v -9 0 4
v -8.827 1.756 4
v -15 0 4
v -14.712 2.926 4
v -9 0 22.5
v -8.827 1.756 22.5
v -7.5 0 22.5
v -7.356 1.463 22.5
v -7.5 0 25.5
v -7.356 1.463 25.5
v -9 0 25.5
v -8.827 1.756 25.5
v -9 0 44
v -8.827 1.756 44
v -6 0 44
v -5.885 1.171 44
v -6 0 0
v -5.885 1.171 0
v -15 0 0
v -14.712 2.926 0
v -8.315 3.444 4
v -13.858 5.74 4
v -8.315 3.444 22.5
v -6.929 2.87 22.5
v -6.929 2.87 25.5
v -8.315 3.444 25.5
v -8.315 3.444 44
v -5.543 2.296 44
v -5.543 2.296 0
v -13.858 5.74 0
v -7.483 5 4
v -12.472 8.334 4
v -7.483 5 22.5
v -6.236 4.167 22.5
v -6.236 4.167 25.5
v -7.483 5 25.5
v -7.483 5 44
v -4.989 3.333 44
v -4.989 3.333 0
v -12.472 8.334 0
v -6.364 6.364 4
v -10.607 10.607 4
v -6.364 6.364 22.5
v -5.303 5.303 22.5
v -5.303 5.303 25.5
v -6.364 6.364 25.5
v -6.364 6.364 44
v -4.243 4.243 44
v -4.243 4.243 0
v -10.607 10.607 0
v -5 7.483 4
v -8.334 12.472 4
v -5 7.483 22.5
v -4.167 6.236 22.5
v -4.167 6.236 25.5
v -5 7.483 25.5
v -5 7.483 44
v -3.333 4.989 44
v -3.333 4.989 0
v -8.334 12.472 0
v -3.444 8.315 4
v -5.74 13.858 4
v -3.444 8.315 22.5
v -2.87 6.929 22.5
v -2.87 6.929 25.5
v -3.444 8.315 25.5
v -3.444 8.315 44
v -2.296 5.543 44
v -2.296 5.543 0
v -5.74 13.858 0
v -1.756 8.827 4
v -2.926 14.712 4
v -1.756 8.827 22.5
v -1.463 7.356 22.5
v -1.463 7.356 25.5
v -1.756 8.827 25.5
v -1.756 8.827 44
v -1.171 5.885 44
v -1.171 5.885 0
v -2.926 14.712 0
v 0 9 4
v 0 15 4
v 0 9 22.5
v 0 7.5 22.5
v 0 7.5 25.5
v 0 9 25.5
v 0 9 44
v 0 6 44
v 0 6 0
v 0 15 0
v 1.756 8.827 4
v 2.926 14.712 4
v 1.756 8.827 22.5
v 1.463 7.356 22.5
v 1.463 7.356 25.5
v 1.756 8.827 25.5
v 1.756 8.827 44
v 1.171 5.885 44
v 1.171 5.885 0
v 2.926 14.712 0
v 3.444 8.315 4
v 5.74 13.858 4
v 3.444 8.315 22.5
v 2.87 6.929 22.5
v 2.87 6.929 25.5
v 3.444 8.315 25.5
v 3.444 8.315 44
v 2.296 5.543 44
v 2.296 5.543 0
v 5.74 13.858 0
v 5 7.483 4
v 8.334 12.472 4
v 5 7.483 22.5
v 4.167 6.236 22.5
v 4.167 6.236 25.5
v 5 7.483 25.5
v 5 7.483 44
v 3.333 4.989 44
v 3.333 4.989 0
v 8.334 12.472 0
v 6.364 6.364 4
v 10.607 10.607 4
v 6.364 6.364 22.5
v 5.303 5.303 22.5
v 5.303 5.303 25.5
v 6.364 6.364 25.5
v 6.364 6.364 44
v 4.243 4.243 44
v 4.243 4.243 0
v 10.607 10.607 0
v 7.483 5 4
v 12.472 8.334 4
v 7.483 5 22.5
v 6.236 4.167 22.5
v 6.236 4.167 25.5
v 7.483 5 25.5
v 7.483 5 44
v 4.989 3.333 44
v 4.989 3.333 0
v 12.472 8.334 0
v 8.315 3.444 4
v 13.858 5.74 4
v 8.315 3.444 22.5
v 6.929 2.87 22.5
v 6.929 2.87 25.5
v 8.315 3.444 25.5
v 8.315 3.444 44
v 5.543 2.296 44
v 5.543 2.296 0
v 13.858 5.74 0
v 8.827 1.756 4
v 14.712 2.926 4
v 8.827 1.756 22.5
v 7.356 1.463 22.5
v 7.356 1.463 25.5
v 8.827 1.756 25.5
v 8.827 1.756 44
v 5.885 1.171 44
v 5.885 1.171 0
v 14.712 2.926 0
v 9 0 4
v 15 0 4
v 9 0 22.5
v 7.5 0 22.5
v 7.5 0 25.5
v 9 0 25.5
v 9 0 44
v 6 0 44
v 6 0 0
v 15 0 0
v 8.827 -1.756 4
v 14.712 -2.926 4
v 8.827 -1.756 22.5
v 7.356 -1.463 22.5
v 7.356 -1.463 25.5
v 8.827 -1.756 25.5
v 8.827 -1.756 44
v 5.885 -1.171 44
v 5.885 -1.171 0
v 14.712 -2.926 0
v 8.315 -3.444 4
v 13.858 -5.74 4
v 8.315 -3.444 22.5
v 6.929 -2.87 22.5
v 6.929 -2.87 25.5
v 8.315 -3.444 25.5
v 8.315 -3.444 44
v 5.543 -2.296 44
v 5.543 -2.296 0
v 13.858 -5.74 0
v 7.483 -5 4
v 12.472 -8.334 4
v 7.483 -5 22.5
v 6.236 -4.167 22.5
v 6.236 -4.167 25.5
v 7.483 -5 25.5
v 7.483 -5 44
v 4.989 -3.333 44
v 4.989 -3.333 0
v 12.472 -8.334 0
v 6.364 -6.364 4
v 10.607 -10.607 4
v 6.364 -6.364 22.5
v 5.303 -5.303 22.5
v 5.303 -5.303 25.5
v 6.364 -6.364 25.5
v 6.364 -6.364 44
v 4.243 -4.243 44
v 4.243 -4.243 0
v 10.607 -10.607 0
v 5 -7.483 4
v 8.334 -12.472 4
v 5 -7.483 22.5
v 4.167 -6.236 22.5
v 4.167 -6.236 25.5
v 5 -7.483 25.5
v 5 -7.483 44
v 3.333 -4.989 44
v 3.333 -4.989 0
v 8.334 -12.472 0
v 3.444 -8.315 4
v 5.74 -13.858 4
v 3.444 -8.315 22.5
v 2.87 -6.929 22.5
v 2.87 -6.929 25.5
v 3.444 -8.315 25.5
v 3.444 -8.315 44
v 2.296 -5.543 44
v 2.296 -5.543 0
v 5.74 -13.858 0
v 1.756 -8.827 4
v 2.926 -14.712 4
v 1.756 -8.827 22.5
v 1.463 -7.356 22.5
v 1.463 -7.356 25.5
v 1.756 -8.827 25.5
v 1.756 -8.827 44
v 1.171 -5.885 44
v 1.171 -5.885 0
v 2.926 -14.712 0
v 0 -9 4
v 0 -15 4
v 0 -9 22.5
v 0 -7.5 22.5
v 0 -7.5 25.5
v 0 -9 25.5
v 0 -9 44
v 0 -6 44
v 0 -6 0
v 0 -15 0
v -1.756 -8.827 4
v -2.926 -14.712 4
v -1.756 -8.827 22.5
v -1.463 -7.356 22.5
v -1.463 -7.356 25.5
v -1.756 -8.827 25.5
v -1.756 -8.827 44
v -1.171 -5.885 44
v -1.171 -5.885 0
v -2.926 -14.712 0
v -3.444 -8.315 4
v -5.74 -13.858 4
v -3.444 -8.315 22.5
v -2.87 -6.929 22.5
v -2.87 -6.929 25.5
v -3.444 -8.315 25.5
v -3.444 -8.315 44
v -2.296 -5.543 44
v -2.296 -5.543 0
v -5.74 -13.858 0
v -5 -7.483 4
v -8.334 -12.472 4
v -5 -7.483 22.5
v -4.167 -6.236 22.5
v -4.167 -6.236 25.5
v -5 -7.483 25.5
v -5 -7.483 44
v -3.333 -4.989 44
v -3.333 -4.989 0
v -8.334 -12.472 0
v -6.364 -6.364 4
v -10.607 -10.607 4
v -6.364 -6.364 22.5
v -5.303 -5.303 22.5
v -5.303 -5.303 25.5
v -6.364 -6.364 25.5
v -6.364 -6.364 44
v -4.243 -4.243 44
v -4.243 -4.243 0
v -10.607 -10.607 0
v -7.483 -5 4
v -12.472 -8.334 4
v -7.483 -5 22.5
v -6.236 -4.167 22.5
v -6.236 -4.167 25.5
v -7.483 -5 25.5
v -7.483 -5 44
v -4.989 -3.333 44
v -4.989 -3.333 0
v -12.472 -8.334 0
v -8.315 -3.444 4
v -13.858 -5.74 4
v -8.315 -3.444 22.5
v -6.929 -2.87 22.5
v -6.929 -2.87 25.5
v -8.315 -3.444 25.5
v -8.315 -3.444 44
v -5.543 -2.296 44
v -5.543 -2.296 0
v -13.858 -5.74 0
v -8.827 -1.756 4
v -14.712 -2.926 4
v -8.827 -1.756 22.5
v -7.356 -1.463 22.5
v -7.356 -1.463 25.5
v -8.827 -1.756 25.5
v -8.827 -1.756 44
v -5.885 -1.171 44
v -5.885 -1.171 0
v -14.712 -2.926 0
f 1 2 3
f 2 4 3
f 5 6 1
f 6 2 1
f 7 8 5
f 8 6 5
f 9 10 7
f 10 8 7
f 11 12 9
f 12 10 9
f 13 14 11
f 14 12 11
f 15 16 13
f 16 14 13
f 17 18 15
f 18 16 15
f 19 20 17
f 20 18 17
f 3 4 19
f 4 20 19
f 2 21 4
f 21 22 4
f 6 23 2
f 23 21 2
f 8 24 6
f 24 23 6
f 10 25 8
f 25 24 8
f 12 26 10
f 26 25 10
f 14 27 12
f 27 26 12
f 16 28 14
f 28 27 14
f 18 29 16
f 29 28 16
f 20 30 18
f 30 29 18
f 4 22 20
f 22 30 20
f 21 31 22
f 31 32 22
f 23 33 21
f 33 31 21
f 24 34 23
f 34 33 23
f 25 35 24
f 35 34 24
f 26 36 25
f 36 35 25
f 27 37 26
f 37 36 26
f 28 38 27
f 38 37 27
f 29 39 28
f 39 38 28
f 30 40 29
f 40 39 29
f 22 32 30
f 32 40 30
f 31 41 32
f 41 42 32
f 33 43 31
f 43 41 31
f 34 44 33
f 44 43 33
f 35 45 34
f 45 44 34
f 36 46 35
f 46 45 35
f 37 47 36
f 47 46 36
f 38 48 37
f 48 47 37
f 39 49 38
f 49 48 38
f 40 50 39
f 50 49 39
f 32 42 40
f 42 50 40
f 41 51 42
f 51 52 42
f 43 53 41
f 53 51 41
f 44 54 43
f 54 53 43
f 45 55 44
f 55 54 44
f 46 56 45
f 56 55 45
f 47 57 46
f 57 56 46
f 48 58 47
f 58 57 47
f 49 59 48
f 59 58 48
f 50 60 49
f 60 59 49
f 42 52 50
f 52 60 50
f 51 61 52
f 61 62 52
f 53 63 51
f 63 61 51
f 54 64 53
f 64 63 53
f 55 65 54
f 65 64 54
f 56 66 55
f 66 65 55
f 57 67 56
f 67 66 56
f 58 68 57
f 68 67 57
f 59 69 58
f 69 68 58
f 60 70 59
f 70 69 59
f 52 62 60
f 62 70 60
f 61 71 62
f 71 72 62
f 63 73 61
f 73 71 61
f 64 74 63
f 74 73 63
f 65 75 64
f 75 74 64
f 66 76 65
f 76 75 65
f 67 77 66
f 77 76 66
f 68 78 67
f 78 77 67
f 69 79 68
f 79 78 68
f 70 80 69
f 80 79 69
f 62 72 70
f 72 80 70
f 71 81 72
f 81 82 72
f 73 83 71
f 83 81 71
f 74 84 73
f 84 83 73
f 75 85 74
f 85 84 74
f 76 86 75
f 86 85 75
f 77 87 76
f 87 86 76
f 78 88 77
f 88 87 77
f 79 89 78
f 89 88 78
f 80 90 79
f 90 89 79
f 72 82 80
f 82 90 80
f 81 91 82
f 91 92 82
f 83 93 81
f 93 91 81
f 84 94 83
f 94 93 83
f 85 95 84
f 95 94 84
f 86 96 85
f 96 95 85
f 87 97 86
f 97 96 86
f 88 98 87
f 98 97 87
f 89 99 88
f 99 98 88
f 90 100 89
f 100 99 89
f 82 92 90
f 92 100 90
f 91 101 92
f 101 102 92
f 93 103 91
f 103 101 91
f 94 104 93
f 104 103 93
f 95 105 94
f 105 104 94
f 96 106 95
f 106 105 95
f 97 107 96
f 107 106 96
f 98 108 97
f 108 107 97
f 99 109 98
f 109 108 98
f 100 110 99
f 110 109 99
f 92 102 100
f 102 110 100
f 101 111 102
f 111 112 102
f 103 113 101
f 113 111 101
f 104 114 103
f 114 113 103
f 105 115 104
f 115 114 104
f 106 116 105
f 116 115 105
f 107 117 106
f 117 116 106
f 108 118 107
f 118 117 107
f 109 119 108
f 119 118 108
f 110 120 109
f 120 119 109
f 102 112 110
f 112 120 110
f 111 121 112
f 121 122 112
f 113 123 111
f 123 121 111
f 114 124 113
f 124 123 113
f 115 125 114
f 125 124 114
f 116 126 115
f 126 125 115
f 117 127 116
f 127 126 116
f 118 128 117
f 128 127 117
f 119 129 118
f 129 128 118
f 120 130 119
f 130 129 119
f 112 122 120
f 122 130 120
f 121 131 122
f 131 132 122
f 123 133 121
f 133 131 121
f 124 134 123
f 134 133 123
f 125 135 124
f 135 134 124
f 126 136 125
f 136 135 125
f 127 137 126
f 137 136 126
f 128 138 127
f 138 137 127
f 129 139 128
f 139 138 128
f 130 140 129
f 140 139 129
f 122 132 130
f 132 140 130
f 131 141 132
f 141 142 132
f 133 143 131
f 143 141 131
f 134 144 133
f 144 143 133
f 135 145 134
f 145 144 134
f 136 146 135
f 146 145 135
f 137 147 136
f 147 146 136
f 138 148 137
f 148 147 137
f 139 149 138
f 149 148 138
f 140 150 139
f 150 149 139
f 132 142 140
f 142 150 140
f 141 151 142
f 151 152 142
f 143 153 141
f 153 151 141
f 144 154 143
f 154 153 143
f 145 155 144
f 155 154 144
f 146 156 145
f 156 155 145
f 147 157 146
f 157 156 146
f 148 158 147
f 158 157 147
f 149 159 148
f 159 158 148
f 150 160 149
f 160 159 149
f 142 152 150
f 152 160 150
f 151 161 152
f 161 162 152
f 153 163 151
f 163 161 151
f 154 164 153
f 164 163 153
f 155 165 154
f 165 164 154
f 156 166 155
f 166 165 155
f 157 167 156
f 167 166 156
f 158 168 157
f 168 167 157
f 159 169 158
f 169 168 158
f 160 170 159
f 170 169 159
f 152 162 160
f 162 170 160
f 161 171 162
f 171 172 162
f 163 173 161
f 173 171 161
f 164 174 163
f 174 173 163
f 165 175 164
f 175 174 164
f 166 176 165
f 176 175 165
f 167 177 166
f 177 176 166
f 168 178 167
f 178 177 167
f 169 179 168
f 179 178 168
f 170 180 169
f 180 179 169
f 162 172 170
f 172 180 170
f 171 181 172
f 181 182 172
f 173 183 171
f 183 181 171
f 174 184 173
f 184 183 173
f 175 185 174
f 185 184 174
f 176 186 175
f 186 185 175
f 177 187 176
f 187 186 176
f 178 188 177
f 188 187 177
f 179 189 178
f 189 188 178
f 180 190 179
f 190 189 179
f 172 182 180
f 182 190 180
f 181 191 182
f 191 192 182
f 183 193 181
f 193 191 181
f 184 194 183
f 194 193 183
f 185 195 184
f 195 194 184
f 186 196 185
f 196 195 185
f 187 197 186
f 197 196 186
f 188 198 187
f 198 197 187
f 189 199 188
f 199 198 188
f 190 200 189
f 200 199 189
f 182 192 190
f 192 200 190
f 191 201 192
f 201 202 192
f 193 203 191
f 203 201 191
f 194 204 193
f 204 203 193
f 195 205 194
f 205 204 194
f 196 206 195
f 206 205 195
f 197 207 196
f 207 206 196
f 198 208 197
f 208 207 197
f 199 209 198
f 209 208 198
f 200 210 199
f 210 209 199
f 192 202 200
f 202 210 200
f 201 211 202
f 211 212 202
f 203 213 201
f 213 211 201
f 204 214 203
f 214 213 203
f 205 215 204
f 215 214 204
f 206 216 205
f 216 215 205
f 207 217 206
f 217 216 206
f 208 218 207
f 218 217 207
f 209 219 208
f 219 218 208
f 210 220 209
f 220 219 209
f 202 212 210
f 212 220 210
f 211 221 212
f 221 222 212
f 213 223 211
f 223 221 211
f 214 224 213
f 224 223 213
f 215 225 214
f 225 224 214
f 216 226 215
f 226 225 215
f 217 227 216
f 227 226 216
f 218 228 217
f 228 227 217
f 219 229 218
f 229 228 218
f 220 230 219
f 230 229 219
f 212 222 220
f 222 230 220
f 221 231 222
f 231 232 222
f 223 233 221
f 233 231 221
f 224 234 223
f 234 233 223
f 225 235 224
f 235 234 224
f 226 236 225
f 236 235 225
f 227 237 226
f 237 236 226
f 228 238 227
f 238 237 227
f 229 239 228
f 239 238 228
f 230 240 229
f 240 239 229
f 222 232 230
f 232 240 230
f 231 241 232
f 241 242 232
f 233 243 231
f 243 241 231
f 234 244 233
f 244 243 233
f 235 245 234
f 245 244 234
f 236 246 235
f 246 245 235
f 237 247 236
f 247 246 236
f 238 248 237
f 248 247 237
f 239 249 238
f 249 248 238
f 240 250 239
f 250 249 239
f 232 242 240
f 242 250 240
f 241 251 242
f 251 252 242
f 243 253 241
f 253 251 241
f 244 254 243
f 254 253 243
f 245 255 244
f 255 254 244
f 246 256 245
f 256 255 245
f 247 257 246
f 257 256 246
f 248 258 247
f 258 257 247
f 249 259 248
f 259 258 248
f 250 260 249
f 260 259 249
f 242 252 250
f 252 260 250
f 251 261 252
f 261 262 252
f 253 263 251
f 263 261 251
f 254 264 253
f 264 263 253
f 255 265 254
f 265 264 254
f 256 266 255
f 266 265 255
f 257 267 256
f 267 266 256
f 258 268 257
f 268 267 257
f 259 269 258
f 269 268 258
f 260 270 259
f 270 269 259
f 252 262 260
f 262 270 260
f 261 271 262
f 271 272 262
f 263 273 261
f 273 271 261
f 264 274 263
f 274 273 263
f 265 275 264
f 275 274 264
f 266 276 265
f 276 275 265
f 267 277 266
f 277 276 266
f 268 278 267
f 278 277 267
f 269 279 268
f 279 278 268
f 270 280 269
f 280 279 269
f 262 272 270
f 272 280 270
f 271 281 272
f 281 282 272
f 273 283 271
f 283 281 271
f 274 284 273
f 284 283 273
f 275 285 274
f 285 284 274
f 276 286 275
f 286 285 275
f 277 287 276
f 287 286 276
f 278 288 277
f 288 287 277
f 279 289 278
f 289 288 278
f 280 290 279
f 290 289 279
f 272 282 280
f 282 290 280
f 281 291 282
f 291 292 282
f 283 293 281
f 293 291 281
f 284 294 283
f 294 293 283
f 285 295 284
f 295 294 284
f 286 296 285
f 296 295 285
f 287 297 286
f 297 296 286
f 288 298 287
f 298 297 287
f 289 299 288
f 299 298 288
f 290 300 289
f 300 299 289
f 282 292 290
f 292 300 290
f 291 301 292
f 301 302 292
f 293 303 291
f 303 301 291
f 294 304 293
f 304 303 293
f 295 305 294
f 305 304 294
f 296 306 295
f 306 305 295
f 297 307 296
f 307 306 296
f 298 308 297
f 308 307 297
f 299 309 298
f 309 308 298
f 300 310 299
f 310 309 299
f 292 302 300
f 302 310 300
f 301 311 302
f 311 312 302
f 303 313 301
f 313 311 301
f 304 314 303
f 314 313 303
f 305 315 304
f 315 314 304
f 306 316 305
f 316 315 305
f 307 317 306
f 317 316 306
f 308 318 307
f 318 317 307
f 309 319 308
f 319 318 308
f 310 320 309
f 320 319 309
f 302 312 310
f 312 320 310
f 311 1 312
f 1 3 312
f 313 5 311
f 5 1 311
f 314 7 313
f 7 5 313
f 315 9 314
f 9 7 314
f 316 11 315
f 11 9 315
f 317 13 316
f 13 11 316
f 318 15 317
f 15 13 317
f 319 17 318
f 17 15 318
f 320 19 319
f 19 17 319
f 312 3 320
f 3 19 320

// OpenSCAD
$fn = 32;

// ----------------------------------------------------------------------
// Grooved revolve: flanged, bore R6
// ----------------------------------------------------------------------

// --- parameters (mm) ---
bore_r = 6;               // bore radius
outer_r = 9;              // outer radius of the body
total_h = 44;             // overall height, Z
wall = 3;                 // radial wall thickness
groove_w = 3;             // groove width
groove_d = 1.5;           // groove depth
grooves = 1;              // number of outer grooves
flange_r = 15;            // flange radius
flange_h = 4;             // flange height

bbox_x = 2 * flange_r;  // full diameter
bore_d = 2 * bore_r;  // bore diameter
body_d = 2 * outer_r;  // body diameter
flange_d = 2 * flange_r;  // flange diameter
revolve_angle = 360;  // full turn around the Z axis

profile = [[6, 0], [9, 0], [15, 0], [15, 4], [9, 4], [9, 22.5], [7.5, 22.5], [7.5, 25.5], [9, 25.5], [9, 44], [6, 44]];  // primary outline, 11 points, counter clockwise

// --- the one profile operation ---
rotate_extrude(angle = revolve_angle) polygon(points = profile);
